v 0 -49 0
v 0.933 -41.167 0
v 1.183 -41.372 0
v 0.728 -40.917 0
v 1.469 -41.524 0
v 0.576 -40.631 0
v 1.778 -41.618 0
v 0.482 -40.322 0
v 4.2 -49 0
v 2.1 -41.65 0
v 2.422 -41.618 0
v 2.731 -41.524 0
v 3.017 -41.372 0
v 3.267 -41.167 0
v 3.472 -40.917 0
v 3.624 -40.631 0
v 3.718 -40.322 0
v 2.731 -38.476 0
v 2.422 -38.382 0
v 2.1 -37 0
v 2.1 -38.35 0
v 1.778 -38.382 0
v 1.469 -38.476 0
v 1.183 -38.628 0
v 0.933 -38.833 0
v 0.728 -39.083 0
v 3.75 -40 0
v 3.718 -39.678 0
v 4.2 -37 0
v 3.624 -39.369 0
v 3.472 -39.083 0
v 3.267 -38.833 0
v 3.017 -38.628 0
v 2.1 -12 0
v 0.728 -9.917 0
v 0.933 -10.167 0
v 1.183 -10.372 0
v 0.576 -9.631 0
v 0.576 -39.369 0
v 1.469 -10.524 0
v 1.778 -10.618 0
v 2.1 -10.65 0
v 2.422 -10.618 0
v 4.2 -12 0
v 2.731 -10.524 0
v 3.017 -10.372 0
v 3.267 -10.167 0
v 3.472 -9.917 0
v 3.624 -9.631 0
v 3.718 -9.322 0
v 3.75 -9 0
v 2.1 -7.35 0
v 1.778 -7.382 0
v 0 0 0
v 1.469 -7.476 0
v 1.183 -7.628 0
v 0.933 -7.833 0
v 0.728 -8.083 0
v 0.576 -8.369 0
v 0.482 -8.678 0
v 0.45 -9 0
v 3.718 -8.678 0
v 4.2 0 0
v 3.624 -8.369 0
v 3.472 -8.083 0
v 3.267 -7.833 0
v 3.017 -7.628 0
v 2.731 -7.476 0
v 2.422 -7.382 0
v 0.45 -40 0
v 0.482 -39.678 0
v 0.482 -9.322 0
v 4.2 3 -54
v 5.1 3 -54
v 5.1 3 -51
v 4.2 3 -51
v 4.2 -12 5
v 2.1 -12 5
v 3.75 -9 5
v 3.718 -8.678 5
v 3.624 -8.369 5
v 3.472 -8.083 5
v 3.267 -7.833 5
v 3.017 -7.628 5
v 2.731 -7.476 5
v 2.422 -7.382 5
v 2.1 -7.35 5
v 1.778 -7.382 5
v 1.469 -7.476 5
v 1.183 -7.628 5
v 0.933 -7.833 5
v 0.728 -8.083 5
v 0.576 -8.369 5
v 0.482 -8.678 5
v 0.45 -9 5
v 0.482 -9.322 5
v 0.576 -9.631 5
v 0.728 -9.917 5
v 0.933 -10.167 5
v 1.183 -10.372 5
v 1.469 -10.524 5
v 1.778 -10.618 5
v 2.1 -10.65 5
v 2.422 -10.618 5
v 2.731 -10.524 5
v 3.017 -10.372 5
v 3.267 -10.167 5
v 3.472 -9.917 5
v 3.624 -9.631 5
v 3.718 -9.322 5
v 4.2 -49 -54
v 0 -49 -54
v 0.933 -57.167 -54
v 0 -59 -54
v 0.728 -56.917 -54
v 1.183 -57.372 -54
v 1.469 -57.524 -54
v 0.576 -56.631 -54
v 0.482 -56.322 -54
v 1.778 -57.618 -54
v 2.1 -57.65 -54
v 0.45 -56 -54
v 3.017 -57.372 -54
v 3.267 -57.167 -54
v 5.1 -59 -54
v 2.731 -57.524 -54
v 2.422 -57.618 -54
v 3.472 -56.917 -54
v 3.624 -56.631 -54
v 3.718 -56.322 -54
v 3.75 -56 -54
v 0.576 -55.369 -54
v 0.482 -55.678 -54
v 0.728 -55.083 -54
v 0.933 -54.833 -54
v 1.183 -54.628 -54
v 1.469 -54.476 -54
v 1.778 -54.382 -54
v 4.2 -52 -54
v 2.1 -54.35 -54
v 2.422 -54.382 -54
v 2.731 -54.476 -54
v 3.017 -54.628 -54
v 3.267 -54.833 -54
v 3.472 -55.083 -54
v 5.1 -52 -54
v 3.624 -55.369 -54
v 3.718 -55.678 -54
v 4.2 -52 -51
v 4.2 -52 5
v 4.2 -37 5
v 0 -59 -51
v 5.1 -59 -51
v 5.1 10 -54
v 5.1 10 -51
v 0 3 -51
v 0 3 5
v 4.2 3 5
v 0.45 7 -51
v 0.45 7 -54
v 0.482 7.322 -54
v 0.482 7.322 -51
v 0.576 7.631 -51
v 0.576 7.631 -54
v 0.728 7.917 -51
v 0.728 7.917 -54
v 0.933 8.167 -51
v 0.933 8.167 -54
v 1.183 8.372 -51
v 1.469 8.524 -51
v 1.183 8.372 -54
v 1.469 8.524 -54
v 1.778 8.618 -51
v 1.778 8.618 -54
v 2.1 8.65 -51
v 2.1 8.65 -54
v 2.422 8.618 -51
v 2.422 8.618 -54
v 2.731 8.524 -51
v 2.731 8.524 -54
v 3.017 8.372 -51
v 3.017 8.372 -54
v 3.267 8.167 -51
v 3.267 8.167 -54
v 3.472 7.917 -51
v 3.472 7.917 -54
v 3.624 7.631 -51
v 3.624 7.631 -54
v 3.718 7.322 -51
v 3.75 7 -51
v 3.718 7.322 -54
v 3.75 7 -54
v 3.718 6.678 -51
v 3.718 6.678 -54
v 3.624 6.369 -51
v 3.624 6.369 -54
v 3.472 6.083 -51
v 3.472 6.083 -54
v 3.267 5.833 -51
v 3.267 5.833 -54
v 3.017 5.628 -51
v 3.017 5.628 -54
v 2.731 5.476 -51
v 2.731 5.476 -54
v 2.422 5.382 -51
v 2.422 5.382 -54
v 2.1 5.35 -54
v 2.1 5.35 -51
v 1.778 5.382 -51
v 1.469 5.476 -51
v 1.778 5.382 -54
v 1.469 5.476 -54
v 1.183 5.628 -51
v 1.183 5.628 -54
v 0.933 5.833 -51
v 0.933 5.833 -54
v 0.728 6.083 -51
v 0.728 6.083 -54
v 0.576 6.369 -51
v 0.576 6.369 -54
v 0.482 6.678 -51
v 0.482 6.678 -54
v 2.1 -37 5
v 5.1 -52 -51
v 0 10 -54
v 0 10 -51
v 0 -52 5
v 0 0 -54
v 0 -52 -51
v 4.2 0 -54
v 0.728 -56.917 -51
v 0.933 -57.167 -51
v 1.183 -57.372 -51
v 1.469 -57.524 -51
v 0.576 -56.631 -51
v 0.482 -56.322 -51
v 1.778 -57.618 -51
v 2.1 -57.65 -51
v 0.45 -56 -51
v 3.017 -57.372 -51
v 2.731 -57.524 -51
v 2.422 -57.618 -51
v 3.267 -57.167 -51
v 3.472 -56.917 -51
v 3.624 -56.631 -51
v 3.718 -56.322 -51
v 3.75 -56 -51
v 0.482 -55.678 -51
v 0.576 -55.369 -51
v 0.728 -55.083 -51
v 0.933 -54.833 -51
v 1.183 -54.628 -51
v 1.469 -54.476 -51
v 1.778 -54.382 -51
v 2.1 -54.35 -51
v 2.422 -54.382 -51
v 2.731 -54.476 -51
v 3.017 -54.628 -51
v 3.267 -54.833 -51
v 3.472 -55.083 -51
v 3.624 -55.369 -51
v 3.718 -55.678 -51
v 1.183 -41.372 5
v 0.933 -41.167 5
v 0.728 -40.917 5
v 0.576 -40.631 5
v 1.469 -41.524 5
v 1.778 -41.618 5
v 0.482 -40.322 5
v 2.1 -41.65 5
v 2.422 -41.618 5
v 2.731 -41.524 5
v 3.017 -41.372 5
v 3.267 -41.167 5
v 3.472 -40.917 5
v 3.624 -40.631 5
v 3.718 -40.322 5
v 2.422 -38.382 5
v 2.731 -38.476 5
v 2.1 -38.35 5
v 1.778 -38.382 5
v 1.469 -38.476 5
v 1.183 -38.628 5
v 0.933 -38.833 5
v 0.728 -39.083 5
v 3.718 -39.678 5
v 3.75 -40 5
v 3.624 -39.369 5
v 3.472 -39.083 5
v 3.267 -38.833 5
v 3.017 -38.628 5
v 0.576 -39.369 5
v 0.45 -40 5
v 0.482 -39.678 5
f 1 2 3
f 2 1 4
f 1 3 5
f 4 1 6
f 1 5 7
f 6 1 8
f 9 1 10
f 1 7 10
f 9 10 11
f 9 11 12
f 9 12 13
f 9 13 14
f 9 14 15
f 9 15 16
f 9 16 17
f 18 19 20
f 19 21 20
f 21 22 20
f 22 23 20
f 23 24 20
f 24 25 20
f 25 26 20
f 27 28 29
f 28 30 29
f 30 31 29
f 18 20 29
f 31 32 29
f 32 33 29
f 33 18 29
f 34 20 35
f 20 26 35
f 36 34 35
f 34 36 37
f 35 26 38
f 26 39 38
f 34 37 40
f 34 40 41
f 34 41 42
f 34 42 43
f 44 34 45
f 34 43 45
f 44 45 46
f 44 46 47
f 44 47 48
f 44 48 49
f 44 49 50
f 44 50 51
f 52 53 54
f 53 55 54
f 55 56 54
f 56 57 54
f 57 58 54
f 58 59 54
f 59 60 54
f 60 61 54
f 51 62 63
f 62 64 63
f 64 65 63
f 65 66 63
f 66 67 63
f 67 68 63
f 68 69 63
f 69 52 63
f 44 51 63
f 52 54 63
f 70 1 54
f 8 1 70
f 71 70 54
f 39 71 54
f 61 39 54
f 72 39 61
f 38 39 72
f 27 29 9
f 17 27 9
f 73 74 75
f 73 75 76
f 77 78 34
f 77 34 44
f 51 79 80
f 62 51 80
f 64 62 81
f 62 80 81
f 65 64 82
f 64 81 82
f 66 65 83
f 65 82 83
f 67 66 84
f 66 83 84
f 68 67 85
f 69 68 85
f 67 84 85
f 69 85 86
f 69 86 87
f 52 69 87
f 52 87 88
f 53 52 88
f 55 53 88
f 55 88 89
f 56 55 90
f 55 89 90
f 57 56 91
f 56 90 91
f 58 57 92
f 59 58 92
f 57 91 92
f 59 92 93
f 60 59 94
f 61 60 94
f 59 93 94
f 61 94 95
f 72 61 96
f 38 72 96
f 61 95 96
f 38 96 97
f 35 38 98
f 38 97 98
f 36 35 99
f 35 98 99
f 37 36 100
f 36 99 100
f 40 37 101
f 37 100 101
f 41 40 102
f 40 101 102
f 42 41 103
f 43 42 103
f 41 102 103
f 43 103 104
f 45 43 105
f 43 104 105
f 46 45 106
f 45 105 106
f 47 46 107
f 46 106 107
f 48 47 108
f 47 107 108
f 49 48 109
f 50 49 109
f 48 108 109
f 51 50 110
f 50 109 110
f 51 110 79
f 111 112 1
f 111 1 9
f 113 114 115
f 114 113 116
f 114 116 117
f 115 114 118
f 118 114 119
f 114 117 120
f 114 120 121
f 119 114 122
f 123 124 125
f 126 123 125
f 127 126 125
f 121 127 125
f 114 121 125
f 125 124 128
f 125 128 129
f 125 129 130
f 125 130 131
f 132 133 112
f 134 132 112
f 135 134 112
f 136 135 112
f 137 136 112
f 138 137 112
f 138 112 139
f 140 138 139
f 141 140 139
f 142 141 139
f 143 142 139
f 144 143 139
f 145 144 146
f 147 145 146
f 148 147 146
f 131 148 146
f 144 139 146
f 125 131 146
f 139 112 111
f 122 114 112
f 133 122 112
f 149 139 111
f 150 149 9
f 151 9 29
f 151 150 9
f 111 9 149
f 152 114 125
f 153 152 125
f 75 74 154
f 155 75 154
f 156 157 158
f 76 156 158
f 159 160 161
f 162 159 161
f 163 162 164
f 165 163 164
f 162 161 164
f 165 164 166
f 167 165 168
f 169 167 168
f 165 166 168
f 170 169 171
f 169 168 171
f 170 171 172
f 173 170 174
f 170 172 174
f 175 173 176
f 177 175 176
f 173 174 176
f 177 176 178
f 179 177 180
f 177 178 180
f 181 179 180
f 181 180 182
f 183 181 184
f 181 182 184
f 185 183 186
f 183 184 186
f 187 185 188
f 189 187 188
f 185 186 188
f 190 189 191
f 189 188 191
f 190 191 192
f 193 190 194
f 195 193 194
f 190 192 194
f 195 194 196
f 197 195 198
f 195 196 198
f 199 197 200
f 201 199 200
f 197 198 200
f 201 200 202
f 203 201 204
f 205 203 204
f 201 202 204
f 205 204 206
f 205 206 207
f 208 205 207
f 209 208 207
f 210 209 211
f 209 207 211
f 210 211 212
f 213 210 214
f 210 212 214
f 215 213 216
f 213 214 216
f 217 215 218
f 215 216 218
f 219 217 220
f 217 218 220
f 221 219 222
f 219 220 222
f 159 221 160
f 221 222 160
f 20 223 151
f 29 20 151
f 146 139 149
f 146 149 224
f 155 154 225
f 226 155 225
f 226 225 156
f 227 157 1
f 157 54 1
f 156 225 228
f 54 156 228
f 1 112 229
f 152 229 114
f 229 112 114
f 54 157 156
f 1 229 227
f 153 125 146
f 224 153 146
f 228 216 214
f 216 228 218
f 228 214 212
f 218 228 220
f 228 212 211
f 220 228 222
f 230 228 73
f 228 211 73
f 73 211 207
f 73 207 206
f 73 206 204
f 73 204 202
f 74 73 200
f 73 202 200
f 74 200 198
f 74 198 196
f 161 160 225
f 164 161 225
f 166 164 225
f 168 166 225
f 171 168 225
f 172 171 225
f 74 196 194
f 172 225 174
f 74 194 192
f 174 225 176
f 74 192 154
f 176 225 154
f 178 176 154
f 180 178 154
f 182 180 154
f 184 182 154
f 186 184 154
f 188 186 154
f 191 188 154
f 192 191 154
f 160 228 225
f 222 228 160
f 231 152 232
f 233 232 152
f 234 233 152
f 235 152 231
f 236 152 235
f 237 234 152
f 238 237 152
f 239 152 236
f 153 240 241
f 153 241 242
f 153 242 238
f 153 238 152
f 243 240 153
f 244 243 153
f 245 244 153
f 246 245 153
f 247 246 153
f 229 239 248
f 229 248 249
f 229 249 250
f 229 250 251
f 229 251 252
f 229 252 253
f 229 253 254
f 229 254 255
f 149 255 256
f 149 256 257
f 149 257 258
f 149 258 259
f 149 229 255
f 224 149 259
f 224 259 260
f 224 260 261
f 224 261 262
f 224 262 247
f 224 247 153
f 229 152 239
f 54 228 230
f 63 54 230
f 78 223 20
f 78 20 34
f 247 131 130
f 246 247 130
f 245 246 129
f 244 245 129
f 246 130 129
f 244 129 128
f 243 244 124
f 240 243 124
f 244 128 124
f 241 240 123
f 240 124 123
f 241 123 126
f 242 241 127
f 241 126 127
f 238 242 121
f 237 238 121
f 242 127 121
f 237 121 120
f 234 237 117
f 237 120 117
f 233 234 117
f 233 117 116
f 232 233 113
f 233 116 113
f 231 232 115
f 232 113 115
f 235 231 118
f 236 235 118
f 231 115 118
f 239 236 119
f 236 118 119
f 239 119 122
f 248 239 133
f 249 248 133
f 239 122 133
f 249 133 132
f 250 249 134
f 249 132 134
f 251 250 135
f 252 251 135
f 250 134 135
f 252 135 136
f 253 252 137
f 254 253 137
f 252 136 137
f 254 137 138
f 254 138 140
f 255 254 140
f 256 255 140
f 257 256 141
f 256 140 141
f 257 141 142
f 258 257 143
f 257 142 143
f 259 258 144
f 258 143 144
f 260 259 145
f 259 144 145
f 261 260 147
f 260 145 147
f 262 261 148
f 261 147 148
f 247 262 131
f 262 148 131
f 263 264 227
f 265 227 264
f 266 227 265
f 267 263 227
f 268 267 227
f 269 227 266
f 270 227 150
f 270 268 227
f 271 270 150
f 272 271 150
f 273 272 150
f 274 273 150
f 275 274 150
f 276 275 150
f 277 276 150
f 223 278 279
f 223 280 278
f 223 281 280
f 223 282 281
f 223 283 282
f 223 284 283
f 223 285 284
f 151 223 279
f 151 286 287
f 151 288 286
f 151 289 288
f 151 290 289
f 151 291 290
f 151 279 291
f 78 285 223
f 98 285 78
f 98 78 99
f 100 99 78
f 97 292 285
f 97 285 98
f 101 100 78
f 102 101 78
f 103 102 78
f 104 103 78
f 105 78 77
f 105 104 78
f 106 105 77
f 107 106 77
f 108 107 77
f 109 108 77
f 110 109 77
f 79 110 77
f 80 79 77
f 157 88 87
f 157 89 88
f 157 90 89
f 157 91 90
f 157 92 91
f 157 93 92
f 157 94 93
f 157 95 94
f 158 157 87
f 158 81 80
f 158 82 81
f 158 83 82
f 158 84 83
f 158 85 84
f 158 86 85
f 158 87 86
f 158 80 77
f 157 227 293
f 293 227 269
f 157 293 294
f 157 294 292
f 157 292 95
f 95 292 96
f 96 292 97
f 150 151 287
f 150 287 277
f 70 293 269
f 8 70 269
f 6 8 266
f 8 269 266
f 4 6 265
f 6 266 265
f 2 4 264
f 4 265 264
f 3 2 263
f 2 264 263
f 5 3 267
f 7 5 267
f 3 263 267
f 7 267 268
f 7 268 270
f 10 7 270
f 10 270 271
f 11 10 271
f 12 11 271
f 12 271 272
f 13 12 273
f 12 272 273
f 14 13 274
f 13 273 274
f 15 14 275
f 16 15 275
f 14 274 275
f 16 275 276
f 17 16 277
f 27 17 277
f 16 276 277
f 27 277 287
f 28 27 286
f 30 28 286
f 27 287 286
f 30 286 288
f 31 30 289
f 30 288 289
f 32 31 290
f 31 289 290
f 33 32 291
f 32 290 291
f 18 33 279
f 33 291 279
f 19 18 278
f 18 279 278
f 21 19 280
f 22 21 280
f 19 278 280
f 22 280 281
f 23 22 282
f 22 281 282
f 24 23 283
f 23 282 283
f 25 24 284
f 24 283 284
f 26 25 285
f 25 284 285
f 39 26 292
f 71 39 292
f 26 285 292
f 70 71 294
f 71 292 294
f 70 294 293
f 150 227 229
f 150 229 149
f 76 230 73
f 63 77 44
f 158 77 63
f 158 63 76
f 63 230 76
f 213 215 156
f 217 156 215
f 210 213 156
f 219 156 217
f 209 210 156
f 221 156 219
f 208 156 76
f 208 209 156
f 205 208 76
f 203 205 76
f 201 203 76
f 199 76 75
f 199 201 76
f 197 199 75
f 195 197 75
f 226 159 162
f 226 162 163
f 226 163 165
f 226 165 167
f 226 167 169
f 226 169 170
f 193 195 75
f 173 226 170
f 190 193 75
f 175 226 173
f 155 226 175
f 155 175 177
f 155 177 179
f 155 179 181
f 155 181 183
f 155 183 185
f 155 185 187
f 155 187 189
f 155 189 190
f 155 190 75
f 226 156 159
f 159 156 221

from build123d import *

# Parameters (mm, degrees)
SKETCH_1_W          = 4.2
SKETCH_1_H          = 49
EXTRUDE_1_DEPTH     = 5
SKETCH_5_R          = 1.65
CUT_EXTRUDE_2_DEPTH = 5
SKETCH_6_W          = 4.2
SKETCH_6_H          = 3
EXTRUDE_2_DEPTH     = 59
SKETCH_11_R         = 1.65
EXTRUDE_3_DEPTH     = 3
SKETCH_12_W         = 6.956074108
SKETCH_12_H         = 25
CUT_EXTRUDE_3_DEPTH = 10


with BuildPart() as part:
    # 草图1 → 凸台-拉伸1 (new body)
    with BuildSketch(Plane.XY):
        with Locations((2.1, -24.5)):
            Rectangle(SKETCH_1_W, SKETCH_1_H)
    extrude(amount=EXTRUDE_1_DEPTH)

    # 草图5 → 切除-拉伸2 (cut)
    with BuildSketch(Plane.XY.offset(5)):
        with Locations((2.1, -9)):
            Circle(SKETCH_5_R)
        with Locations(Location((2.1, -40, 0), (0, 0, 180))):
            Circle(SKETCH_5_R)
    extrude(amount=-CUT_EXTRUDE_2_DEPTH, mode=Mode.SUBTRACT)

    # 草图6 → 凸台-拉伸2 (add)
    with BuildSketch(Plane.XY.offset(5)):
        with Locations((2.1, -50.5)):
            Rectangle(SKETCH_6_W, SKETCH_6_H)
        with Locations((2.1, 1.5)):
            Rectangle(SKETCH_6_W, SKETCH_6_H)
    extrude(amount=-EXTRUDE_2_DEPTH)

    # 草图11 → 凸台-拉伸3 (add)
    # profile 1 of 2: a face of its own
    with BuildSketch(Plane(origin=(0, 0, -54), x_dir=(-1, 0, 0), z_dir=(0, 0, -1))):
        Polygon((-2.1, 3), (-5.1, 3), (-5.1, 10), (0, 10), (0, 3), align=None)
        with Locations((-2.1, 7)):
            Circle(SKETCH_11_R, mode=Mode.SUBTRACT)
    # profile 2 of 2: a face of its own
    with BuildSketch(Plane(origin=(0, 0, -54), x_dir=(-1, 0, 0), z_dir=(0, 0, -1))):
        Polygon((0, -59), (-5.1, -59), (-5.1, -52), (-2.1, -52), (0, -52), align=None)
        with Locations(Location((-2.1, -56, 0), (0, 0, 180))):
            Circle(SKETCH_11_R, mode=Mode.SUBTRACT)
    extrude(amount=-EXTRUDE_3_DEPTH)

    # 草图12 → 切除-拉伸3 (cut)
    with BuildSketch(Plane.XY.offset(5)):
        with Locations((5.578037054, -24.5)):
            Rectangle(SKETCH_12_W, SKETCH_12_H)
    extrude(amount=-CUT_EXTRUDE_3_DEPTH, mode=Mode.SUBTRACT)


solid = part.part
